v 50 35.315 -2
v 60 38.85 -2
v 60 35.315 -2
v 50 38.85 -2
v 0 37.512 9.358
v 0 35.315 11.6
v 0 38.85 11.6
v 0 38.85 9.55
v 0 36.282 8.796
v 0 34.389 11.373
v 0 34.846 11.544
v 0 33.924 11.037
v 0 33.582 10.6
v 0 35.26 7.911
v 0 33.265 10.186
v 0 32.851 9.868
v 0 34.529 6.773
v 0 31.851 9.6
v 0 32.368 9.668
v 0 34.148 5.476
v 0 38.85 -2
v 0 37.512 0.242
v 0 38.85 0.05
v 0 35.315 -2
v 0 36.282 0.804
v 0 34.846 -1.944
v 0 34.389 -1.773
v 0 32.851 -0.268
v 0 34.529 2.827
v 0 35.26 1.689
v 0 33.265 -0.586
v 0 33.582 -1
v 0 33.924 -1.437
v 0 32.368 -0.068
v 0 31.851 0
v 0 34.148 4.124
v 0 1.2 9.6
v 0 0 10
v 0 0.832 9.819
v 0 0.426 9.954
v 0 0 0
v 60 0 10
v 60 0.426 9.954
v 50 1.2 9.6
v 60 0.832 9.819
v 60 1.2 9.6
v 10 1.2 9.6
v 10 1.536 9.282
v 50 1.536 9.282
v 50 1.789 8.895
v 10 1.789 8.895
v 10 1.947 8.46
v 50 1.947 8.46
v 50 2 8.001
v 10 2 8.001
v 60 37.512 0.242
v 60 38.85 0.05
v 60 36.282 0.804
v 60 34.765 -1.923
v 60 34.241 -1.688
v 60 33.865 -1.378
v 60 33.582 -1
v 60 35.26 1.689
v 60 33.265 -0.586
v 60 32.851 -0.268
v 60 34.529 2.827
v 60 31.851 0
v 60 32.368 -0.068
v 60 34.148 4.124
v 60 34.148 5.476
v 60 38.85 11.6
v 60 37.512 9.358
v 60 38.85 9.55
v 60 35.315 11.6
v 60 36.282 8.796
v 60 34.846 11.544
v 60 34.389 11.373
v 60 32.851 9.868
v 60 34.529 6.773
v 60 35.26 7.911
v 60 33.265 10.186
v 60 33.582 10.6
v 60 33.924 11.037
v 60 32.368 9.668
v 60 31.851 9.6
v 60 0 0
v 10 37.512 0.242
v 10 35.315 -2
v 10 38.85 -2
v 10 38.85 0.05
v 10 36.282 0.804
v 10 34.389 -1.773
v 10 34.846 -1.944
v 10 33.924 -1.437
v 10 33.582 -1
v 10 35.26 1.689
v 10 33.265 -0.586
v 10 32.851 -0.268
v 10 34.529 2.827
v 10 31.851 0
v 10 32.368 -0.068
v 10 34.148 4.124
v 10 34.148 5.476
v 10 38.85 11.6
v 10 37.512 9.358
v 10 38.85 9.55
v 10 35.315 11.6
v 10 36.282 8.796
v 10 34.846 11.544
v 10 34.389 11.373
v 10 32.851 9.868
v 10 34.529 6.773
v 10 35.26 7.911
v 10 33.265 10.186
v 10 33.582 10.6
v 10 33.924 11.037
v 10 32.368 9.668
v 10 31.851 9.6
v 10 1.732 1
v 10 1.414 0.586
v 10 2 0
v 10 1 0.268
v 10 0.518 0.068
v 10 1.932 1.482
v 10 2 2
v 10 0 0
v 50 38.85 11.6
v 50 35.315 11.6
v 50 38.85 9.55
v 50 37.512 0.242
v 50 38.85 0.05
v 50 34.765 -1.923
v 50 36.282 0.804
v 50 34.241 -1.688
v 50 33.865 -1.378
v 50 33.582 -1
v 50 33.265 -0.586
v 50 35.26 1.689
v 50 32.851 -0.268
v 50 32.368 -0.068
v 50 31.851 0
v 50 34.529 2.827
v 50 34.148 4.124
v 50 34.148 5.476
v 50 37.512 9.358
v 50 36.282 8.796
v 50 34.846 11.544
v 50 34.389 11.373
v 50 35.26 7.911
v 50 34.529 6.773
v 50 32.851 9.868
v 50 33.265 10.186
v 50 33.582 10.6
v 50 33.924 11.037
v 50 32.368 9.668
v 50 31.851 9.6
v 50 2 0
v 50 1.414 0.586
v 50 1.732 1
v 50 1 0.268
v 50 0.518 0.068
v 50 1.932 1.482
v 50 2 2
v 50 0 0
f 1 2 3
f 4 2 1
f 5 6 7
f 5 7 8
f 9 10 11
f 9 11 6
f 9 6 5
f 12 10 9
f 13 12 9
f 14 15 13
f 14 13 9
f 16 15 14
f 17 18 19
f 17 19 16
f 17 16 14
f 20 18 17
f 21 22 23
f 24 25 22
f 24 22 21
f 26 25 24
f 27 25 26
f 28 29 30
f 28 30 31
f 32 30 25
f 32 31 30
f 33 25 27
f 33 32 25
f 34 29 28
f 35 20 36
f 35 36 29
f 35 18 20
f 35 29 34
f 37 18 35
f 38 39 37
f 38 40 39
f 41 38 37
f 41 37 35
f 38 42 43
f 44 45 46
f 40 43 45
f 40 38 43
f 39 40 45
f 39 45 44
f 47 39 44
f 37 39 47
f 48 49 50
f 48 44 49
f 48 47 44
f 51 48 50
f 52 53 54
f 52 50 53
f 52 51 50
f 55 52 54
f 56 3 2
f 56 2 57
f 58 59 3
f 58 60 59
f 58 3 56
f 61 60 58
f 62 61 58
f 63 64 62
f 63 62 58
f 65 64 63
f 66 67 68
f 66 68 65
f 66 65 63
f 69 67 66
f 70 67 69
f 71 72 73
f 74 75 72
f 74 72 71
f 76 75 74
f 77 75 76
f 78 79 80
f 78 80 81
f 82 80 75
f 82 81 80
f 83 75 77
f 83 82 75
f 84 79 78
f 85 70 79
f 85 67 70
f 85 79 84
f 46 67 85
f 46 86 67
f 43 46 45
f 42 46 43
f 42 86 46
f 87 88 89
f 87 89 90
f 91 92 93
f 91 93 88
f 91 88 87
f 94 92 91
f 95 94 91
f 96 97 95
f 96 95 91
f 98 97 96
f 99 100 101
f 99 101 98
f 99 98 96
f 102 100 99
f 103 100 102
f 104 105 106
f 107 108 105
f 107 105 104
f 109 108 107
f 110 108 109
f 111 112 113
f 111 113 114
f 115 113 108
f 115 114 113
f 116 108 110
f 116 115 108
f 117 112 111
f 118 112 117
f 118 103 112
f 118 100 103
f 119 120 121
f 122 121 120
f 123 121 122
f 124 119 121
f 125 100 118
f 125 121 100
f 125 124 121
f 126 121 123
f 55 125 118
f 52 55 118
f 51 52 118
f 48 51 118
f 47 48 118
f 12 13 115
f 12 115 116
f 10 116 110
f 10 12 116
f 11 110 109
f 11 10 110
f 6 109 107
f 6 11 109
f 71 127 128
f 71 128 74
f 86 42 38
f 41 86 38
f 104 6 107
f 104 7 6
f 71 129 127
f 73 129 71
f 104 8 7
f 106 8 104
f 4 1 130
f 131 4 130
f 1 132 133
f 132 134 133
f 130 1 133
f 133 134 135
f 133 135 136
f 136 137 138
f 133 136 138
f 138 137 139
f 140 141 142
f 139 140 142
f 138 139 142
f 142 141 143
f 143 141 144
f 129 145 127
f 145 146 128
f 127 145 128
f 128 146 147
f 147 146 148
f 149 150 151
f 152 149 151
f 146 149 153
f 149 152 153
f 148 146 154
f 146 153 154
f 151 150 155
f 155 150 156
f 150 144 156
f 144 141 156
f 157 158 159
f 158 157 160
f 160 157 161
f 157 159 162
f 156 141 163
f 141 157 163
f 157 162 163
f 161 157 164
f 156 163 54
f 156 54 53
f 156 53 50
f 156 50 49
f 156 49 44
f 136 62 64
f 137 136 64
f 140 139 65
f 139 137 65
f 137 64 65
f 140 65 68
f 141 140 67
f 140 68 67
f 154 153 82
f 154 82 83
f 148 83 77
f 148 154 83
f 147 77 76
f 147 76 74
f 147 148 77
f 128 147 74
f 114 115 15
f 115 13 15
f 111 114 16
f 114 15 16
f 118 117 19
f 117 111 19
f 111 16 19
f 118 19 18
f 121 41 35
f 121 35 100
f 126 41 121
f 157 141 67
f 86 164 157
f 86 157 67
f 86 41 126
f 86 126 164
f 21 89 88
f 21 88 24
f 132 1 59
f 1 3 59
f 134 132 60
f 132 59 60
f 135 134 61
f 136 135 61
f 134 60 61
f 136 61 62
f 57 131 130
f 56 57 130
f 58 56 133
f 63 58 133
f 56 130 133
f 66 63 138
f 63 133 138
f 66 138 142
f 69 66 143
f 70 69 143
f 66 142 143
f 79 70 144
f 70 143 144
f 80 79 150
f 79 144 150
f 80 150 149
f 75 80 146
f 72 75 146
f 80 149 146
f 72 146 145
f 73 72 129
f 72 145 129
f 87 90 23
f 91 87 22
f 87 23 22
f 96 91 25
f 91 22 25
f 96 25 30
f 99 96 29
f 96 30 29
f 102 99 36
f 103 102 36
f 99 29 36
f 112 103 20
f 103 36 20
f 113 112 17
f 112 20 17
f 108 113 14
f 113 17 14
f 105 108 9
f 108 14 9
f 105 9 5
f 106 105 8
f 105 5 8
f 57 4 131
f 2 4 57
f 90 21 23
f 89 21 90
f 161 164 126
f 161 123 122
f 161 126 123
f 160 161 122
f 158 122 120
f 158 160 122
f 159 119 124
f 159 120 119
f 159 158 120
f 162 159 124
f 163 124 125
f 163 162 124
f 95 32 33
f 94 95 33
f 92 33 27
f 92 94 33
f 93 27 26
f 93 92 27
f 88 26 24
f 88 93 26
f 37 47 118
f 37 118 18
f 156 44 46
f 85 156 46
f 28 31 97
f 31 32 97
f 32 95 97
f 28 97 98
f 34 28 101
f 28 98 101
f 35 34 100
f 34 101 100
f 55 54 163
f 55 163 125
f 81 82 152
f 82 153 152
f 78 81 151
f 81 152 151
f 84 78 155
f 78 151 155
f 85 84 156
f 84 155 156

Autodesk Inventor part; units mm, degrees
ref_plane "YZ Plane" through (0, 0, 0) normal (1, 0, 0) x (0, 1, 0)
ref_plane "XZ Plane" through (0, 0, 0) normal (0, 1, 0) x (-1, 0, 0)
ref_plane "XY Plane" through (0, 0, 0) normal (0, 0, 1) x (1, 0, 0)
sketch "Sketch1" plane through (0, 0, 0) normal (0, 1, 0) x (-1, 0, 0)
  line L0 (0, 0) -> (-60, 0)
  line L1 (-60, 0) -> (-60, 10)
  line L2 (-60, 10) -> (0, 10)
  line L3 (0, 10) -> (0, 0)
  dimension "d0" = 60
  dimension "d1" = 10
extrude "Extrusion1" add sketch "Sketch1" along normal blind 2
sketch "Sketch2" plane through (0, 2, 0) normal (0, 1, 0) x (1, 0, 0)
  line L0 (0, 0) -> (0, -10) projected
  line L1 (0, 0) -> (10, 0)
  line L2 (10, 0) -> (10, -9.6)
  line L3 (10, -9.6) -> (0, -9.6)
  line L4 (0, -9.6) -> (0, 0)
  line L5 (60, -10) -> (60, 0) projected
  line L6 (60, 0) -> (50, 0)
  line L7 (50, 0) -> (50, -9.6)
  line L8 (50, -9.6) -> (60, -9.6)
  line L9 (60, -9.6) -> (60, 0)
  dimension "d4" = 10
  dimension "d5" = 9.6
  dimension "d6" = 10
  dimension "d7" = 9.6
extrude "Extrusion2" add sketch "Sketch2" along normal blind 36.85
sketch "Sketch3" plane through (0, 2, 9.6) normal (0, 0, 1) x (1, 0, 0)
  line L0 (0, -2) -> (0, 36.85) projected
  line L1 (10, 0) -> (10, 36.85) projected
  line L2 (0, 36.85) -> (10, 36.85)
  line L3 (10, 36.85) -> (10, 31.85)
  line L4 (10, 31.85) -> (0, 31.85)
  line L5 (0, 31.85) -> (0, 36.85)
  line L6 (50, 0) -> (50, 36.85) projected
  line L7 (60, -2) -> (60, 36.85) projected
  line L8 (50, 36.85) -> (60, 36.85)
  line L9 (60, 36.85) -> (60, 31.85)
  line L10 (60, 31.85) -> (50, 31.85)
  line L11 (50, 31.85) -> (50, 36.85)
  point P0 (0, 31.85)
  dimension "d10" = 5
  dimension "d11" = 5
extrude "Extrusion3" add sketch "Sketch3" along normal blind 2
sketch "Sketch4" plane through (60, 0, 0) normal (0, 0, -1) x (-1, 0, 0)
  line L0 (0, 0) -> (0, 38.85) projected
  line L1 (10, 2) -> (10, 38.85) projected
  line L2 (0, 38.85) -> (10, 38.85)
  line L3 (10, 38.85) -> (10, 33.85)
  line L4 (10, 33.85) -> (0, 33.85)
  line L5 (0, 33.85) -> (0, 38.85)
  line L6 (50, 2) -> (50, 38.85) projected
  line L7 (60, 0) -> (60, 38.85) projected
  line L8 (50, 38.85) -> (60, 38.85)
  line L9 (60, 38.85) -> (60, 33.85)
  line L10 (60, 33.85) -> (50, 33.85)
  line L11 (50, 33.85) -> (50, 38.85)
  point P0 (0, 33.85)
  dimension "d14" = 5
  dimension "d15" = 5
extrude "Extrusion4" add sketch "Sketch4" along normal blind 2
sketch "Sketch5" plane through (0, 0, 0) normal (-1, 0, 0) x (0, 0, 1)
  line L0 (-2, 38.85) -> (11.6, 38.85) projected
  circle A0 centre (4.8, 38.85) radius 4.75
  point P0 (0, 0)
  dimension "d18" = 9.5
extrude "Extrusion5" cut sketch "Sketch5" against normal through all
fillet "Fillet1" radius 2 8 edges at (55, 33.85, 0) (55, 33.85, 9.6) (55, 33.85, 11.6) (55, 33.85, -2) (5, 33.85, 0) (5, 33.85, -2) (5, 33.85, 9.6) (5, 33.85, 11.6)
fillet "Fillet2" radius 2 2 edges at (30, 2, 10) (30, 2, 0)
properties part number "dg_mount"
